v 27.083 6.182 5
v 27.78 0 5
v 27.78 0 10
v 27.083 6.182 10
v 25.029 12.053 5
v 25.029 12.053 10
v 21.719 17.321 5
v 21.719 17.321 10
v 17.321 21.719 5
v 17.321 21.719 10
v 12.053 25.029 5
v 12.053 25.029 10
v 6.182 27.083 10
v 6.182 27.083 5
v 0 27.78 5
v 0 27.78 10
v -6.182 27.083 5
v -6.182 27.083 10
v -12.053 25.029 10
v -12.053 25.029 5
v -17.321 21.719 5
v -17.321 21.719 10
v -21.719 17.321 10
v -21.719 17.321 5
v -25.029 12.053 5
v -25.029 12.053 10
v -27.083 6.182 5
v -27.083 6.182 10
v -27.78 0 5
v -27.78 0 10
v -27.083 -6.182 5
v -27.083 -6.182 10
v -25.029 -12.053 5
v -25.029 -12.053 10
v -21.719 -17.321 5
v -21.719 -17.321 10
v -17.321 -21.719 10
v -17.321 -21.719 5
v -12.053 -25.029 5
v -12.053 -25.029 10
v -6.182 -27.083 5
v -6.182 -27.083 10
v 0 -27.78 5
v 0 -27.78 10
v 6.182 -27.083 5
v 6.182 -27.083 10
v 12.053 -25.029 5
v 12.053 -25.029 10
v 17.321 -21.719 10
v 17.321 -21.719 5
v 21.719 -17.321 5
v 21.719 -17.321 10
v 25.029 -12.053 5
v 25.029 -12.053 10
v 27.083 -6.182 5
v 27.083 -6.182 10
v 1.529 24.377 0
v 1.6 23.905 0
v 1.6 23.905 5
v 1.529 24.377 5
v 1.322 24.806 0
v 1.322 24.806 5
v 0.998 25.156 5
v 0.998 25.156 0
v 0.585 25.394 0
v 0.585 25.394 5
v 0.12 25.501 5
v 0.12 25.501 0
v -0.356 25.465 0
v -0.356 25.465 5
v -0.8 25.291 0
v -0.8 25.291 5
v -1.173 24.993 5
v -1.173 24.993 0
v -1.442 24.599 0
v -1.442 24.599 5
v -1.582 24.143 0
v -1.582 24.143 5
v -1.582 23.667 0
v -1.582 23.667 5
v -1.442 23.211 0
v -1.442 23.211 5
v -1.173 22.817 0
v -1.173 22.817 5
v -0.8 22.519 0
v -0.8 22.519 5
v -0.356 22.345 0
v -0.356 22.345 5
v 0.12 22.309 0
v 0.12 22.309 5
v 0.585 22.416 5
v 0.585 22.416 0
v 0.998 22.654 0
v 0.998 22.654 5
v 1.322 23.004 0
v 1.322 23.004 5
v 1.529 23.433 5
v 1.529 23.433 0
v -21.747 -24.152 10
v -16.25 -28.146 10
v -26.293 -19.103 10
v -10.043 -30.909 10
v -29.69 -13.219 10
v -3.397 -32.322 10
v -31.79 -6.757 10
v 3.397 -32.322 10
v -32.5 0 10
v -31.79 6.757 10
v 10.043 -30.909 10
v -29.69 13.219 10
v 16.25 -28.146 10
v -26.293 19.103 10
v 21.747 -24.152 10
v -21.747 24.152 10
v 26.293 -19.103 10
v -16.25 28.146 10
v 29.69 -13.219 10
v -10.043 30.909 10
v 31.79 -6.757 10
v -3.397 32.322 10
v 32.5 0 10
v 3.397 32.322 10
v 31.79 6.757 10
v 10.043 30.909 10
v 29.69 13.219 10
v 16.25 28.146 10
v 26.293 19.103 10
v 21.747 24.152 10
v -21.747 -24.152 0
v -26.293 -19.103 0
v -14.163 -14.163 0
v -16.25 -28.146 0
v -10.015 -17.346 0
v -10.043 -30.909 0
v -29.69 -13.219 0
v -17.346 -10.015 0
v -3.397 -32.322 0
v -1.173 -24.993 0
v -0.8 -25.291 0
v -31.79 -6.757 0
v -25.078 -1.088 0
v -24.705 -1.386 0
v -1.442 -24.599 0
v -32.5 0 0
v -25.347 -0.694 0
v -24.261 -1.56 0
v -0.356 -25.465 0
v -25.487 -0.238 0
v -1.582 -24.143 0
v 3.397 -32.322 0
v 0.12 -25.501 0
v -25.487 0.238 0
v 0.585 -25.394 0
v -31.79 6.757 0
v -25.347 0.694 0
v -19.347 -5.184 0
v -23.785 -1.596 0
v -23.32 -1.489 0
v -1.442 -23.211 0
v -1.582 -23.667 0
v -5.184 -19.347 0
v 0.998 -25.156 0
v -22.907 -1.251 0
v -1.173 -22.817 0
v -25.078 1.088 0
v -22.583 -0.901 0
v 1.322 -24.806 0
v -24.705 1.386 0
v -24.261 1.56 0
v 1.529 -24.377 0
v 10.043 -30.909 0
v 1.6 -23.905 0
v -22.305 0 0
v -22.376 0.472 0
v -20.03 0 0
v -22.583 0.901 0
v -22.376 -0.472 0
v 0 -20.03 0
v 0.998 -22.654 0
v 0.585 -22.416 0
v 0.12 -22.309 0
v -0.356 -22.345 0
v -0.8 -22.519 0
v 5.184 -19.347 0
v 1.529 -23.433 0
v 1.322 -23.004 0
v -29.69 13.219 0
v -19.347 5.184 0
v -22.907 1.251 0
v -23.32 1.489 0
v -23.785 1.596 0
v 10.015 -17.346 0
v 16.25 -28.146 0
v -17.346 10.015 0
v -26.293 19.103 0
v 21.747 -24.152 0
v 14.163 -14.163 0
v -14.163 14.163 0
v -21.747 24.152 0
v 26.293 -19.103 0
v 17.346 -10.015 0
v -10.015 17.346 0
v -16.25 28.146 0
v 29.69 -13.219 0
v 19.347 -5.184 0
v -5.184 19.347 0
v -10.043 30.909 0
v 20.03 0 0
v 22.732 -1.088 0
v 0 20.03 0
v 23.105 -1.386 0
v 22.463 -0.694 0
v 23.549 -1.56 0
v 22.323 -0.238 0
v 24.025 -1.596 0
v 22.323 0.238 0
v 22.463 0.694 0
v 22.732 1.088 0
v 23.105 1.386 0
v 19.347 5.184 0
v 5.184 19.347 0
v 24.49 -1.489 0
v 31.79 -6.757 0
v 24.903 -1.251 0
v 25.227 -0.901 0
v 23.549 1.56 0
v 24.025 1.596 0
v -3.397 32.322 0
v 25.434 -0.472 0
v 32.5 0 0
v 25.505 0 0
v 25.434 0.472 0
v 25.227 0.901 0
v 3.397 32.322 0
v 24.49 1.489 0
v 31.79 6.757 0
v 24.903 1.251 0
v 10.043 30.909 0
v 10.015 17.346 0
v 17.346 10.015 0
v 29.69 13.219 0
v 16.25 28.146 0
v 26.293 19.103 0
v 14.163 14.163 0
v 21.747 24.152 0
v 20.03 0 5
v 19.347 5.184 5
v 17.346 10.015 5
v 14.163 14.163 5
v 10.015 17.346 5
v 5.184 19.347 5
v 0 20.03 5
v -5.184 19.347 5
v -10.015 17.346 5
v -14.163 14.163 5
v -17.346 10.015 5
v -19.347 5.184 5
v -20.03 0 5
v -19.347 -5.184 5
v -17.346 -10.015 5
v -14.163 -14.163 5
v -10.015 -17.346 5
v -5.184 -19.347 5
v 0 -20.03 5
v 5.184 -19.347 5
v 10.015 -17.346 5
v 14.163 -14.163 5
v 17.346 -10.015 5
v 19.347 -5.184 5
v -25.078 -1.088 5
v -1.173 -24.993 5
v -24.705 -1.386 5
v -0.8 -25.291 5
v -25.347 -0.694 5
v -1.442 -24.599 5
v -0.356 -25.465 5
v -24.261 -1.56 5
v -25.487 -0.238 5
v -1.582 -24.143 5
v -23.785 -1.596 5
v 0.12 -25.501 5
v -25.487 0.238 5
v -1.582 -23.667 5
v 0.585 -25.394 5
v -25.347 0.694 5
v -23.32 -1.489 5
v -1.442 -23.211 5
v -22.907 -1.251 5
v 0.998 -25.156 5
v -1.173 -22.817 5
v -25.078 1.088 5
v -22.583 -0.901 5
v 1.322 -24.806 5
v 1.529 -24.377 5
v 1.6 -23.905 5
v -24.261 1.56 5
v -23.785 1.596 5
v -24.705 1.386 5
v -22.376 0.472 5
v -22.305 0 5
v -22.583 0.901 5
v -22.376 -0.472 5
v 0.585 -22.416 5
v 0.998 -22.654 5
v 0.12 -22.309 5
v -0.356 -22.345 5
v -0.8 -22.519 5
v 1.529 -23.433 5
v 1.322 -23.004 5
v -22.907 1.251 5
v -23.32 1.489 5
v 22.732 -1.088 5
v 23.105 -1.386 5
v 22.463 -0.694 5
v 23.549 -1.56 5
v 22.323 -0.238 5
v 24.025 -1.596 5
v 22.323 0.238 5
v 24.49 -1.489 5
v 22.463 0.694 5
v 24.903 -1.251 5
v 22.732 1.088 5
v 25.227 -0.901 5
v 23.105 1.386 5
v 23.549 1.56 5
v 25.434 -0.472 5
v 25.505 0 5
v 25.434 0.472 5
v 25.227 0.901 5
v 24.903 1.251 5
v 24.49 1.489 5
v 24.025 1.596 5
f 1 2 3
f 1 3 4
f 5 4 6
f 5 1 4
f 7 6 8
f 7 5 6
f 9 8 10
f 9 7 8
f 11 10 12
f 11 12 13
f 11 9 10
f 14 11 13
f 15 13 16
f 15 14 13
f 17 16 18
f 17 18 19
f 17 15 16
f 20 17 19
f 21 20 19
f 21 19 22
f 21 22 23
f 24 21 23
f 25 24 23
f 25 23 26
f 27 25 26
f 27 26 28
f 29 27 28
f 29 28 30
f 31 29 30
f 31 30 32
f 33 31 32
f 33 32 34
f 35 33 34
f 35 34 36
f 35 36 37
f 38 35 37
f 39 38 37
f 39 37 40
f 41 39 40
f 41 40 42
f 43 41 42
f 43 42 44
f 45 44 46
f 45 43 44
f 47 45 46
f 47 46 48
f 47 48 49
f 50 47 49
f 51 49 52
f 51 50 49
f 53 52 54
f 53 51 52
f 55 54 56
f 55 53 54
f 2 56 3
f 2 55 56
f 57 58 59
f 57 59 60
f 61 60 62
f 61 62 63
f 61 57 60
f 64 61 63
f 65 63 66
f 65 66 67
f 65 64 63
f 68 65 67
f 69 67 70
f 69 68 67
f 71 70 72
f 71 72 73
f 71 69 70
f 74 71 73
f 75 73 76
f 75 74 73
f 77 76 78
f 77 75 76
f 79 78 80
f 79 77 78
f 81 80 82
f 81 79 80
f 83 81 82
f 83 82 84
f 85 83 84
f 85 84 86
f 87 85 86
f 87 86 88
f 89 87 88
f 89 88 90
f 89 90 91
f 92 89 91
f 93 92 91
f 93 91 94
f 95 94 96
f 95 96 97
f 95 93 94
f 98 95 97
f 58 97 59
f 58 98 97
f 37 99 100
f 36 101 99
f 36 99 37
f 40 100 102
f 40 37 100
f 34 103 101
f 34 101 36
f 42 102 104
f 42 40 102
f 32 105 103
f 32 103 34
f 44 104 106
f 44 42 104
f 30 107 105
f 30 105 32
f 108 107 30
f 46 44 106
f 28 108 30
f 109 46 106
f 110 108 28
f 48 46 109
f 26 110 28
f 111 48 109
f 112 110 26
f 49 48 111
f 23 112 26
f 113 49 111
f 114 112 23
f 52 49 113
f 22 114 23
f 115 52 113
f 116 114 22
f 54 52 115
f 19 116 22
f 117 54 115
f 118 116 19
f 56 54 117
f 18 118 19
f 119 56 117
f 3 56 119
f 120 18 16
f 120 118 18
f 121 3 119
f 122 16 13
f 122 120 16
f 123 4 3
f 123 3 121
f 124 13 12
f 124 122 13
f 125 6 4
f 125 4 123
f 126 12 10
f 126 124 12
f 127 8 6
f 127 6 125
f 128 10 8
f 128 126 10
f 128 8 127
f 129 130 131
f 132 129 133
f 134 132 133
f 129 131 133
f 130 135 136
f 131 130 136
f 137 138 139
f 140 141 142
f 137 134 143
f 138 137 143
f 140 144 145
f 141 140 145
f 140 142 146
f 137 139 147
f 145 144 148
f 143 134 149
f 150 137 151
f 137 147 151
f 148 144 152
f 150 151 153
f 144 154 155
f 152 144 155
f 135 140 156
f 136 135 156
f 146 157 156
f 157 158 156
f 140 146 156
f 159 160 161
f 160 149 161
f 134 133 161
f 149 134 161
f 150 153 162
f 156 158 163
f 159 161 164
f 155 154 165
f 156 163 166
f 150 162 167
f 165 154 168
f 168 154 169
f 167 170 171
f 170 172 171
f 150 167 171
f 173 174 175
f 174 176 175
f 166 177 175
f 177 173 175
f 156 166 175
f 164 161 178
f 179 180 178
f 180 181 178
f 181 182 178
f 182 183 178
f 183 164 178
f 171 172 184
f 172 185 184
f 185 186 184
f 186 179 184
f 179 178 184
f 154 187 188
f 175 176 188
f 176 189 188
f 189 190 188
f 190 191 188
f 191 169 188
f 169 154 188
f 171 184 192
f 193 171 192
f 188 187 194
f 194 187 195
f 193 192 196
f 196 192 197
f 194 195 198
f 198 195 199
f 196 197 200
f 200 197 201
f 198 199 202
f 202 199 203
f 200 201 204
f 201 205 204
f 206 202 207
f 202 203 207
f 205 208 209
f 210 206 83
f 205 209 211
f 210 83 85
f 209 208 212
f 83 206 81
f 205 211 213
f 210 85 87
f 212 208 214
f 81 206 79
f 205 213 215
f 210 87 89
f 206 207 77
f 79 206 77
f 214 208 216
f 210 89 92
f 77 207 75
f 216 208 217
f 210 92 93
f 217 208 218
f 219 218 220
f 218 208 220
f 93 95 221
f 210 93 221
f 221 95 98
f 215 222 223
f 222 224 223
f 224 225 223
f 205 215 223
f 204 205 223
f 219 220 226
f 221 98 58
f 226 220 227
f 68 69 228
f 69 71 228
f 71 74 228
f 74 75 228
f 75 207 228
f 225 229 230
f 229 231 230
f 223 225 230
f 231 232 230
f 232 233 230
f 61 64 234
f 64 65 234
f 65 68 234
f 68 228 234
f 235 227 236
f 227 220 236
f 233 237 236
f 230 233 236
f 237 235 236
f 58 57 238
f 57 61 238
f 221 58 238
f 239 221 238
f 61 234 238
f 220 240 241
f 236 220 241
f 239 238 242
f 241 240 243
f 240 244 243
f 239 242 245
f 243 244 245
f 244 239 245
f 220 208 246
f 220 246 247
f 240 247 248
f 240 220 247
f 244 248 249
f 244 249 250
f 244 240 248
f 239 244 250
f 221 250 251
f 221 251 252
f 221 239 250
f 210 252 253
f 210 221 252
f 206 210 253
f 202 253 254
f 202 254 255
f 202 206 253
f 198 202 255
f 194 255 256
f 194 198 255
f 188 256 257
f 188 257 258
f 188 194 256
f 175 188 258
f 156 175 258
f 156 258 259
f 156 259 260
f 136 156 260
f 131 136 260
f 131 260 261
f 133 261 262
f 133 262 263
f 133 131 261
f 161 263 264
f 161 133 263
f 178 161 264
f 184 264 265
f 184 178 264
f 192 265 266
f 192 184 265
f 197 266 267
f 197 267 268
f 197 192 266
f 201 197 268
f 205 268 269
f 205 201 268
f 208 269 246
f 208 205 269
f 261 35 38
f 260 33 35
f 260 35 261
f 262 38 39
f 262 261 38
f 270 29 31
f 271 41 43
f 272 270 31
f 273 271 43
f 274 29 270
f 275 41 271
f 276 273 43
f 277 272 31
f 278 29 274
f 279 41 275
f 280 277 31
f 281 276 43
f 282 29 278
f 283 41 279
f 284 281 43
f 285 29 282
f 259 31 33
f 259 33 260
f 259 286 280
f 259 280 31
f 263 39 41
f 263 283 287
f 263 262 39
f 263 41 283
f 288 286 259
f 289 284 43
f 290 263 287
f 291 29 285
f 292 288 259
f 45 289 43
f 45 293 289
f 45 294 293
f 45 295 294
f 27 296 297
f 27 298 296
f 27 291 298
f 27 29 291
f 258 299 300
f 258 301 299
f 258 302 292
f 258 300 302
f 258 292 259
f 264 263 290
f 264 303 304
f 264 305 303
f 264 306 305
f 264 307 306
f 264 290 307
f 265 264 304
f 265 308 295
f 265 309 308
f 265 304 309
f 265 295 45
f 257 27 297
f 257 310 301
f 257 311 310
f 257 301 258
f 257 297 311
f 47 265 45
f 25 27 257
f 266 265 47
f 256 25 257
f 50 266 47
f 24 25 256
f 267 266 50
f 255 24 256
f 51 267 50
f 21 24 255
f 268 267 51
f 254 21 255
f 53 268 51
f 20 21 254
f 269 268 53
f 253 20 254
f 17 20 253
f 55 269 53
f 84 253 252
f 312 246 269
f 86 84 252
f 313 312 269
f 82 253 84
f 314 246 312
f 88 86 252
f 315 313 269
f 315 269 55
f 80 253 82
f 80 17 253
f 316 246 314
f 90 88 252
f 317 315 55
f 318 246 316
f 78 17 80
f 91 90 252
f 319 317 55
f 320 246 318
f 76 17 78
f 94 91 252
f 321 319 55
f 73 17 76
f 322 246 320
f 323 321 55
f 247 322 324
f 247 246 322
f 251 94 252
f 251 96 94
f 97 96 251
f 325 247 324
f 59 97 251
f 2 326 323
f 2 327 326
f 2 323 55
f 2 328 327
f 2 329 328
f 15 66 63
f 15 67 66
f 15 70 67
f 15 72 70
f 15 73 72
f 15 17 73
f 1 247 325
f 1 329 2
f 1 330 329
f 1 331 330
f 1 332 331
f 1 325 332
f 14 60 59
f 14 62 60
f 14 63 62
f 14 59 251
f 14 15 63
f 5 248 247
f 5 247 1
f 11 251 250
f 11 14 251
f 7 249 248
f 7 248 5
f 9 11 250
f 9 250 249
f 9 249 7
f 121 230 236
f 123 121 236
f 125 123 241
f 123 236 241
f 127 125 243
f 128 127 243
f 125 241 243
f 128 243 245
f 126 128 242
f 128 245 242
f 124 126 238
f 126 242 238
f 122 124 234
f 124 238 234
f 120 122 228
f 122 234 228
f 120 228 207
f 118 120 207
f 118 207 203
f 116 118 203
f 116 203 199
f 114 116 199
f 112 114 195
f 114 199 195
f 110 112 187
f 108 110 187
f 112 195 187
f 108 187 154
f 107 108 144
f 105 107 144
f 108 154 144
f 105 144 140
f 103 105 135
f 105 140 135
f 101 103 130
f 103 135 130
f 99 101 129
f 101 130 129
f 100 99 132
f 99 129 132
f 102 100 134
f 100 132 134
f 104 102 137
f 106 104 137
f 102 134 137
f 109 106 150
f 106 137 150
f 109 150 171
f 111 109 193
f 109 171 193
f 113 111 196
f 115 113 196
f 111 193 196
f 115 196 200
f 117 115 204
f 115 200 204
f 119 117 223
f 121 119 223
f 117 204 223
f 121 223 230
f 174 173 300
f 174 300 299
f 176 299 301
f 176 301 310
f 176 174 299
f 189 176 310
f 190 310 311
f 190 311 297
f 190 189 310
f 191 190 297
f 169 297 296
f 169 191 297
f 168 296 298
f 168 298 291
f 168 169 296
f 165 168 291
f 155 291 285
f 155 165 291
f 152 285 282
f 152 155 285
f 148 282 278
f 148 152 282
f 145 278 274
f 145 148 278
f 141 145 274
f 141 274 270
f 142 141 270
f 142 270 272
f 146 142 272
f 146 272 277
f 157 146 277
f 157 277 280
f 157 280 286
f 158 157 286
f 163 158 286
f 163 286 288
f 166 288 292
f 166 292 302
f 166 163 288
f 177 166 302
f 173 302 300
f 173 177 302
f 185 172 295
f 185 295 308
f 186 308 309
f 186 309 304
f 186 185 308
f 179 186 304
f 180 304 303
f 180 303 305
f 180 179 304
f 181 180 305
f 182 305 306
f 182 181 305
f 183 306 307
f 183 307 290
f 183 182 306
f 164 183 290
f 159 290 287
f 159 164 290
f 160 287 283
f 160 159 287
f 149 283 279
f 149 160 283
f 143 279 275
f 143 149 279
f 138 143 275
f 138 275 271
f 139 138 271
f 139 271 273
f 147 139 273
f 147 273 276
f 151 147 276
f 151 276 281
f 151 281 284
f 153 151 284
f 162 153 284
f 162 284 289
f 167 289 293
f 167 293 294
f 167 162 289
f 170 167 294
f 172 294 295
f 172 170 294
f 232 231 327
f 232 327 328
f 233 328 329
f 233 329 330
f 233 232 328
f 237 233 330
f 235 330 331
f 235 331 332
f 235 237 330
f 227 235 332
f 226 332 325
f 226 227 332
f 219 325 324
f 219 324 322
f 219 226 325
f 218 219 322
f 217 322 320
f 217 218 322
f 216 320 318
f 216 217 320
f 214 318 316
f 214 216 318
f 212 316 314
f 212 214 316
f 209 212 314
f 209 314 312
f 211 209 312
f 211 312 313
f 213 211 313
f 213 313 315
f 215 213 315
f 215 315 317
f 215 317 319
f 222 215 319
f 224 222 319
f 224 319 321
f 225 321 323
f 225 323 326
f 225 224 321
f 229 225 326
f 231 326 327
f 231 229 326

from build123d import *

# Parameters (mm, degrees)
F0_R     = 32.5
F0_R_2   = 27.78
F1_DEPTH = 10
F0_R_3   = 1.6
F0_R_4   = 20.03
F2_DEPTH = 5


with BuildPart() as f1:
    # F0 (on Top) → F1 (new body)
    with BuildSketch(Plane.XY):
        Circle(F0_R)
        Circle(F0_R_2, mode=Mode.SUBTRACT)
    extrude(amount=F1_DEPTH)

    # F0 (on Top) → F2 (join)
    with BuildSketch(Plane.XY):
        Circle(F0_R_2)
        with Locations((0, -23.905)):
            Circle(F0_R_3, mode=Mode.SUBTRACT)
        with Locations((-23.905, 0)):
            Circle(F0_R_3, mode=Mode.SUBTRACT)
        Circle(F0_R_4, mode=Mode.SUBTRACT)
        with Locations((23.905, 0)):
            Circle(F0_R_3, mode=Mode.SUBTRACT)
        with Locations((0, 23.905)):
            Circle(F0_R_3, mode=Mode.SUBTRACT)
    extrude(amount=F2_DEPTH)


solid = f1.part
